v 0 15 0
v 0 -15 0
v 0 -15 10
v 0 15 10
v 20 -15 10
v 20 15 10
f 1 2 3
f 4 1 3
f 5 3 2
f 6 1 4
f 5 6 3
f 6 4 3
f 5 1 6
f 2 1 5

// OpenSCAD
X=20;
Y=30;
Z=10;
echo(version());
cube_size = 20; // [10:Small,20:Medium,30:Large]

hole_diameter = 2.5;
hole_radius = hole_diameter/2;

// How deep should the center hole be?
hole_depth = 1; // [0,1,5,50]

show_wheels = "yes"; // [yes,no]

// How thick should the side wheels be?
wheel_thickness = 1; // [1:20]

// ignore this variable!
// foo=1;

// don't turn functions into params!
function BEZ03(u) = pow((1-u), 3);

// ignore variable values
bing = 3+4;
baz = 3 / hole_depth;

module triangle(scale) {polyhedron(points = [[0, -10, 60], [0, 10, 60], [0, 10, 0], [0, -10, 0], [60, -10, 60], [60, 10, 60]], 
triangles = [[0,3,2], [0,2,1], [3,0,4], [1,2,5], [0,5,4], [0,1,5],  [5,2,4], [4,2,3], ]);}

//resize(newsize=[X,Y,Z]) triangle(1);
resize([X,Y,Z]) triangle(1);
